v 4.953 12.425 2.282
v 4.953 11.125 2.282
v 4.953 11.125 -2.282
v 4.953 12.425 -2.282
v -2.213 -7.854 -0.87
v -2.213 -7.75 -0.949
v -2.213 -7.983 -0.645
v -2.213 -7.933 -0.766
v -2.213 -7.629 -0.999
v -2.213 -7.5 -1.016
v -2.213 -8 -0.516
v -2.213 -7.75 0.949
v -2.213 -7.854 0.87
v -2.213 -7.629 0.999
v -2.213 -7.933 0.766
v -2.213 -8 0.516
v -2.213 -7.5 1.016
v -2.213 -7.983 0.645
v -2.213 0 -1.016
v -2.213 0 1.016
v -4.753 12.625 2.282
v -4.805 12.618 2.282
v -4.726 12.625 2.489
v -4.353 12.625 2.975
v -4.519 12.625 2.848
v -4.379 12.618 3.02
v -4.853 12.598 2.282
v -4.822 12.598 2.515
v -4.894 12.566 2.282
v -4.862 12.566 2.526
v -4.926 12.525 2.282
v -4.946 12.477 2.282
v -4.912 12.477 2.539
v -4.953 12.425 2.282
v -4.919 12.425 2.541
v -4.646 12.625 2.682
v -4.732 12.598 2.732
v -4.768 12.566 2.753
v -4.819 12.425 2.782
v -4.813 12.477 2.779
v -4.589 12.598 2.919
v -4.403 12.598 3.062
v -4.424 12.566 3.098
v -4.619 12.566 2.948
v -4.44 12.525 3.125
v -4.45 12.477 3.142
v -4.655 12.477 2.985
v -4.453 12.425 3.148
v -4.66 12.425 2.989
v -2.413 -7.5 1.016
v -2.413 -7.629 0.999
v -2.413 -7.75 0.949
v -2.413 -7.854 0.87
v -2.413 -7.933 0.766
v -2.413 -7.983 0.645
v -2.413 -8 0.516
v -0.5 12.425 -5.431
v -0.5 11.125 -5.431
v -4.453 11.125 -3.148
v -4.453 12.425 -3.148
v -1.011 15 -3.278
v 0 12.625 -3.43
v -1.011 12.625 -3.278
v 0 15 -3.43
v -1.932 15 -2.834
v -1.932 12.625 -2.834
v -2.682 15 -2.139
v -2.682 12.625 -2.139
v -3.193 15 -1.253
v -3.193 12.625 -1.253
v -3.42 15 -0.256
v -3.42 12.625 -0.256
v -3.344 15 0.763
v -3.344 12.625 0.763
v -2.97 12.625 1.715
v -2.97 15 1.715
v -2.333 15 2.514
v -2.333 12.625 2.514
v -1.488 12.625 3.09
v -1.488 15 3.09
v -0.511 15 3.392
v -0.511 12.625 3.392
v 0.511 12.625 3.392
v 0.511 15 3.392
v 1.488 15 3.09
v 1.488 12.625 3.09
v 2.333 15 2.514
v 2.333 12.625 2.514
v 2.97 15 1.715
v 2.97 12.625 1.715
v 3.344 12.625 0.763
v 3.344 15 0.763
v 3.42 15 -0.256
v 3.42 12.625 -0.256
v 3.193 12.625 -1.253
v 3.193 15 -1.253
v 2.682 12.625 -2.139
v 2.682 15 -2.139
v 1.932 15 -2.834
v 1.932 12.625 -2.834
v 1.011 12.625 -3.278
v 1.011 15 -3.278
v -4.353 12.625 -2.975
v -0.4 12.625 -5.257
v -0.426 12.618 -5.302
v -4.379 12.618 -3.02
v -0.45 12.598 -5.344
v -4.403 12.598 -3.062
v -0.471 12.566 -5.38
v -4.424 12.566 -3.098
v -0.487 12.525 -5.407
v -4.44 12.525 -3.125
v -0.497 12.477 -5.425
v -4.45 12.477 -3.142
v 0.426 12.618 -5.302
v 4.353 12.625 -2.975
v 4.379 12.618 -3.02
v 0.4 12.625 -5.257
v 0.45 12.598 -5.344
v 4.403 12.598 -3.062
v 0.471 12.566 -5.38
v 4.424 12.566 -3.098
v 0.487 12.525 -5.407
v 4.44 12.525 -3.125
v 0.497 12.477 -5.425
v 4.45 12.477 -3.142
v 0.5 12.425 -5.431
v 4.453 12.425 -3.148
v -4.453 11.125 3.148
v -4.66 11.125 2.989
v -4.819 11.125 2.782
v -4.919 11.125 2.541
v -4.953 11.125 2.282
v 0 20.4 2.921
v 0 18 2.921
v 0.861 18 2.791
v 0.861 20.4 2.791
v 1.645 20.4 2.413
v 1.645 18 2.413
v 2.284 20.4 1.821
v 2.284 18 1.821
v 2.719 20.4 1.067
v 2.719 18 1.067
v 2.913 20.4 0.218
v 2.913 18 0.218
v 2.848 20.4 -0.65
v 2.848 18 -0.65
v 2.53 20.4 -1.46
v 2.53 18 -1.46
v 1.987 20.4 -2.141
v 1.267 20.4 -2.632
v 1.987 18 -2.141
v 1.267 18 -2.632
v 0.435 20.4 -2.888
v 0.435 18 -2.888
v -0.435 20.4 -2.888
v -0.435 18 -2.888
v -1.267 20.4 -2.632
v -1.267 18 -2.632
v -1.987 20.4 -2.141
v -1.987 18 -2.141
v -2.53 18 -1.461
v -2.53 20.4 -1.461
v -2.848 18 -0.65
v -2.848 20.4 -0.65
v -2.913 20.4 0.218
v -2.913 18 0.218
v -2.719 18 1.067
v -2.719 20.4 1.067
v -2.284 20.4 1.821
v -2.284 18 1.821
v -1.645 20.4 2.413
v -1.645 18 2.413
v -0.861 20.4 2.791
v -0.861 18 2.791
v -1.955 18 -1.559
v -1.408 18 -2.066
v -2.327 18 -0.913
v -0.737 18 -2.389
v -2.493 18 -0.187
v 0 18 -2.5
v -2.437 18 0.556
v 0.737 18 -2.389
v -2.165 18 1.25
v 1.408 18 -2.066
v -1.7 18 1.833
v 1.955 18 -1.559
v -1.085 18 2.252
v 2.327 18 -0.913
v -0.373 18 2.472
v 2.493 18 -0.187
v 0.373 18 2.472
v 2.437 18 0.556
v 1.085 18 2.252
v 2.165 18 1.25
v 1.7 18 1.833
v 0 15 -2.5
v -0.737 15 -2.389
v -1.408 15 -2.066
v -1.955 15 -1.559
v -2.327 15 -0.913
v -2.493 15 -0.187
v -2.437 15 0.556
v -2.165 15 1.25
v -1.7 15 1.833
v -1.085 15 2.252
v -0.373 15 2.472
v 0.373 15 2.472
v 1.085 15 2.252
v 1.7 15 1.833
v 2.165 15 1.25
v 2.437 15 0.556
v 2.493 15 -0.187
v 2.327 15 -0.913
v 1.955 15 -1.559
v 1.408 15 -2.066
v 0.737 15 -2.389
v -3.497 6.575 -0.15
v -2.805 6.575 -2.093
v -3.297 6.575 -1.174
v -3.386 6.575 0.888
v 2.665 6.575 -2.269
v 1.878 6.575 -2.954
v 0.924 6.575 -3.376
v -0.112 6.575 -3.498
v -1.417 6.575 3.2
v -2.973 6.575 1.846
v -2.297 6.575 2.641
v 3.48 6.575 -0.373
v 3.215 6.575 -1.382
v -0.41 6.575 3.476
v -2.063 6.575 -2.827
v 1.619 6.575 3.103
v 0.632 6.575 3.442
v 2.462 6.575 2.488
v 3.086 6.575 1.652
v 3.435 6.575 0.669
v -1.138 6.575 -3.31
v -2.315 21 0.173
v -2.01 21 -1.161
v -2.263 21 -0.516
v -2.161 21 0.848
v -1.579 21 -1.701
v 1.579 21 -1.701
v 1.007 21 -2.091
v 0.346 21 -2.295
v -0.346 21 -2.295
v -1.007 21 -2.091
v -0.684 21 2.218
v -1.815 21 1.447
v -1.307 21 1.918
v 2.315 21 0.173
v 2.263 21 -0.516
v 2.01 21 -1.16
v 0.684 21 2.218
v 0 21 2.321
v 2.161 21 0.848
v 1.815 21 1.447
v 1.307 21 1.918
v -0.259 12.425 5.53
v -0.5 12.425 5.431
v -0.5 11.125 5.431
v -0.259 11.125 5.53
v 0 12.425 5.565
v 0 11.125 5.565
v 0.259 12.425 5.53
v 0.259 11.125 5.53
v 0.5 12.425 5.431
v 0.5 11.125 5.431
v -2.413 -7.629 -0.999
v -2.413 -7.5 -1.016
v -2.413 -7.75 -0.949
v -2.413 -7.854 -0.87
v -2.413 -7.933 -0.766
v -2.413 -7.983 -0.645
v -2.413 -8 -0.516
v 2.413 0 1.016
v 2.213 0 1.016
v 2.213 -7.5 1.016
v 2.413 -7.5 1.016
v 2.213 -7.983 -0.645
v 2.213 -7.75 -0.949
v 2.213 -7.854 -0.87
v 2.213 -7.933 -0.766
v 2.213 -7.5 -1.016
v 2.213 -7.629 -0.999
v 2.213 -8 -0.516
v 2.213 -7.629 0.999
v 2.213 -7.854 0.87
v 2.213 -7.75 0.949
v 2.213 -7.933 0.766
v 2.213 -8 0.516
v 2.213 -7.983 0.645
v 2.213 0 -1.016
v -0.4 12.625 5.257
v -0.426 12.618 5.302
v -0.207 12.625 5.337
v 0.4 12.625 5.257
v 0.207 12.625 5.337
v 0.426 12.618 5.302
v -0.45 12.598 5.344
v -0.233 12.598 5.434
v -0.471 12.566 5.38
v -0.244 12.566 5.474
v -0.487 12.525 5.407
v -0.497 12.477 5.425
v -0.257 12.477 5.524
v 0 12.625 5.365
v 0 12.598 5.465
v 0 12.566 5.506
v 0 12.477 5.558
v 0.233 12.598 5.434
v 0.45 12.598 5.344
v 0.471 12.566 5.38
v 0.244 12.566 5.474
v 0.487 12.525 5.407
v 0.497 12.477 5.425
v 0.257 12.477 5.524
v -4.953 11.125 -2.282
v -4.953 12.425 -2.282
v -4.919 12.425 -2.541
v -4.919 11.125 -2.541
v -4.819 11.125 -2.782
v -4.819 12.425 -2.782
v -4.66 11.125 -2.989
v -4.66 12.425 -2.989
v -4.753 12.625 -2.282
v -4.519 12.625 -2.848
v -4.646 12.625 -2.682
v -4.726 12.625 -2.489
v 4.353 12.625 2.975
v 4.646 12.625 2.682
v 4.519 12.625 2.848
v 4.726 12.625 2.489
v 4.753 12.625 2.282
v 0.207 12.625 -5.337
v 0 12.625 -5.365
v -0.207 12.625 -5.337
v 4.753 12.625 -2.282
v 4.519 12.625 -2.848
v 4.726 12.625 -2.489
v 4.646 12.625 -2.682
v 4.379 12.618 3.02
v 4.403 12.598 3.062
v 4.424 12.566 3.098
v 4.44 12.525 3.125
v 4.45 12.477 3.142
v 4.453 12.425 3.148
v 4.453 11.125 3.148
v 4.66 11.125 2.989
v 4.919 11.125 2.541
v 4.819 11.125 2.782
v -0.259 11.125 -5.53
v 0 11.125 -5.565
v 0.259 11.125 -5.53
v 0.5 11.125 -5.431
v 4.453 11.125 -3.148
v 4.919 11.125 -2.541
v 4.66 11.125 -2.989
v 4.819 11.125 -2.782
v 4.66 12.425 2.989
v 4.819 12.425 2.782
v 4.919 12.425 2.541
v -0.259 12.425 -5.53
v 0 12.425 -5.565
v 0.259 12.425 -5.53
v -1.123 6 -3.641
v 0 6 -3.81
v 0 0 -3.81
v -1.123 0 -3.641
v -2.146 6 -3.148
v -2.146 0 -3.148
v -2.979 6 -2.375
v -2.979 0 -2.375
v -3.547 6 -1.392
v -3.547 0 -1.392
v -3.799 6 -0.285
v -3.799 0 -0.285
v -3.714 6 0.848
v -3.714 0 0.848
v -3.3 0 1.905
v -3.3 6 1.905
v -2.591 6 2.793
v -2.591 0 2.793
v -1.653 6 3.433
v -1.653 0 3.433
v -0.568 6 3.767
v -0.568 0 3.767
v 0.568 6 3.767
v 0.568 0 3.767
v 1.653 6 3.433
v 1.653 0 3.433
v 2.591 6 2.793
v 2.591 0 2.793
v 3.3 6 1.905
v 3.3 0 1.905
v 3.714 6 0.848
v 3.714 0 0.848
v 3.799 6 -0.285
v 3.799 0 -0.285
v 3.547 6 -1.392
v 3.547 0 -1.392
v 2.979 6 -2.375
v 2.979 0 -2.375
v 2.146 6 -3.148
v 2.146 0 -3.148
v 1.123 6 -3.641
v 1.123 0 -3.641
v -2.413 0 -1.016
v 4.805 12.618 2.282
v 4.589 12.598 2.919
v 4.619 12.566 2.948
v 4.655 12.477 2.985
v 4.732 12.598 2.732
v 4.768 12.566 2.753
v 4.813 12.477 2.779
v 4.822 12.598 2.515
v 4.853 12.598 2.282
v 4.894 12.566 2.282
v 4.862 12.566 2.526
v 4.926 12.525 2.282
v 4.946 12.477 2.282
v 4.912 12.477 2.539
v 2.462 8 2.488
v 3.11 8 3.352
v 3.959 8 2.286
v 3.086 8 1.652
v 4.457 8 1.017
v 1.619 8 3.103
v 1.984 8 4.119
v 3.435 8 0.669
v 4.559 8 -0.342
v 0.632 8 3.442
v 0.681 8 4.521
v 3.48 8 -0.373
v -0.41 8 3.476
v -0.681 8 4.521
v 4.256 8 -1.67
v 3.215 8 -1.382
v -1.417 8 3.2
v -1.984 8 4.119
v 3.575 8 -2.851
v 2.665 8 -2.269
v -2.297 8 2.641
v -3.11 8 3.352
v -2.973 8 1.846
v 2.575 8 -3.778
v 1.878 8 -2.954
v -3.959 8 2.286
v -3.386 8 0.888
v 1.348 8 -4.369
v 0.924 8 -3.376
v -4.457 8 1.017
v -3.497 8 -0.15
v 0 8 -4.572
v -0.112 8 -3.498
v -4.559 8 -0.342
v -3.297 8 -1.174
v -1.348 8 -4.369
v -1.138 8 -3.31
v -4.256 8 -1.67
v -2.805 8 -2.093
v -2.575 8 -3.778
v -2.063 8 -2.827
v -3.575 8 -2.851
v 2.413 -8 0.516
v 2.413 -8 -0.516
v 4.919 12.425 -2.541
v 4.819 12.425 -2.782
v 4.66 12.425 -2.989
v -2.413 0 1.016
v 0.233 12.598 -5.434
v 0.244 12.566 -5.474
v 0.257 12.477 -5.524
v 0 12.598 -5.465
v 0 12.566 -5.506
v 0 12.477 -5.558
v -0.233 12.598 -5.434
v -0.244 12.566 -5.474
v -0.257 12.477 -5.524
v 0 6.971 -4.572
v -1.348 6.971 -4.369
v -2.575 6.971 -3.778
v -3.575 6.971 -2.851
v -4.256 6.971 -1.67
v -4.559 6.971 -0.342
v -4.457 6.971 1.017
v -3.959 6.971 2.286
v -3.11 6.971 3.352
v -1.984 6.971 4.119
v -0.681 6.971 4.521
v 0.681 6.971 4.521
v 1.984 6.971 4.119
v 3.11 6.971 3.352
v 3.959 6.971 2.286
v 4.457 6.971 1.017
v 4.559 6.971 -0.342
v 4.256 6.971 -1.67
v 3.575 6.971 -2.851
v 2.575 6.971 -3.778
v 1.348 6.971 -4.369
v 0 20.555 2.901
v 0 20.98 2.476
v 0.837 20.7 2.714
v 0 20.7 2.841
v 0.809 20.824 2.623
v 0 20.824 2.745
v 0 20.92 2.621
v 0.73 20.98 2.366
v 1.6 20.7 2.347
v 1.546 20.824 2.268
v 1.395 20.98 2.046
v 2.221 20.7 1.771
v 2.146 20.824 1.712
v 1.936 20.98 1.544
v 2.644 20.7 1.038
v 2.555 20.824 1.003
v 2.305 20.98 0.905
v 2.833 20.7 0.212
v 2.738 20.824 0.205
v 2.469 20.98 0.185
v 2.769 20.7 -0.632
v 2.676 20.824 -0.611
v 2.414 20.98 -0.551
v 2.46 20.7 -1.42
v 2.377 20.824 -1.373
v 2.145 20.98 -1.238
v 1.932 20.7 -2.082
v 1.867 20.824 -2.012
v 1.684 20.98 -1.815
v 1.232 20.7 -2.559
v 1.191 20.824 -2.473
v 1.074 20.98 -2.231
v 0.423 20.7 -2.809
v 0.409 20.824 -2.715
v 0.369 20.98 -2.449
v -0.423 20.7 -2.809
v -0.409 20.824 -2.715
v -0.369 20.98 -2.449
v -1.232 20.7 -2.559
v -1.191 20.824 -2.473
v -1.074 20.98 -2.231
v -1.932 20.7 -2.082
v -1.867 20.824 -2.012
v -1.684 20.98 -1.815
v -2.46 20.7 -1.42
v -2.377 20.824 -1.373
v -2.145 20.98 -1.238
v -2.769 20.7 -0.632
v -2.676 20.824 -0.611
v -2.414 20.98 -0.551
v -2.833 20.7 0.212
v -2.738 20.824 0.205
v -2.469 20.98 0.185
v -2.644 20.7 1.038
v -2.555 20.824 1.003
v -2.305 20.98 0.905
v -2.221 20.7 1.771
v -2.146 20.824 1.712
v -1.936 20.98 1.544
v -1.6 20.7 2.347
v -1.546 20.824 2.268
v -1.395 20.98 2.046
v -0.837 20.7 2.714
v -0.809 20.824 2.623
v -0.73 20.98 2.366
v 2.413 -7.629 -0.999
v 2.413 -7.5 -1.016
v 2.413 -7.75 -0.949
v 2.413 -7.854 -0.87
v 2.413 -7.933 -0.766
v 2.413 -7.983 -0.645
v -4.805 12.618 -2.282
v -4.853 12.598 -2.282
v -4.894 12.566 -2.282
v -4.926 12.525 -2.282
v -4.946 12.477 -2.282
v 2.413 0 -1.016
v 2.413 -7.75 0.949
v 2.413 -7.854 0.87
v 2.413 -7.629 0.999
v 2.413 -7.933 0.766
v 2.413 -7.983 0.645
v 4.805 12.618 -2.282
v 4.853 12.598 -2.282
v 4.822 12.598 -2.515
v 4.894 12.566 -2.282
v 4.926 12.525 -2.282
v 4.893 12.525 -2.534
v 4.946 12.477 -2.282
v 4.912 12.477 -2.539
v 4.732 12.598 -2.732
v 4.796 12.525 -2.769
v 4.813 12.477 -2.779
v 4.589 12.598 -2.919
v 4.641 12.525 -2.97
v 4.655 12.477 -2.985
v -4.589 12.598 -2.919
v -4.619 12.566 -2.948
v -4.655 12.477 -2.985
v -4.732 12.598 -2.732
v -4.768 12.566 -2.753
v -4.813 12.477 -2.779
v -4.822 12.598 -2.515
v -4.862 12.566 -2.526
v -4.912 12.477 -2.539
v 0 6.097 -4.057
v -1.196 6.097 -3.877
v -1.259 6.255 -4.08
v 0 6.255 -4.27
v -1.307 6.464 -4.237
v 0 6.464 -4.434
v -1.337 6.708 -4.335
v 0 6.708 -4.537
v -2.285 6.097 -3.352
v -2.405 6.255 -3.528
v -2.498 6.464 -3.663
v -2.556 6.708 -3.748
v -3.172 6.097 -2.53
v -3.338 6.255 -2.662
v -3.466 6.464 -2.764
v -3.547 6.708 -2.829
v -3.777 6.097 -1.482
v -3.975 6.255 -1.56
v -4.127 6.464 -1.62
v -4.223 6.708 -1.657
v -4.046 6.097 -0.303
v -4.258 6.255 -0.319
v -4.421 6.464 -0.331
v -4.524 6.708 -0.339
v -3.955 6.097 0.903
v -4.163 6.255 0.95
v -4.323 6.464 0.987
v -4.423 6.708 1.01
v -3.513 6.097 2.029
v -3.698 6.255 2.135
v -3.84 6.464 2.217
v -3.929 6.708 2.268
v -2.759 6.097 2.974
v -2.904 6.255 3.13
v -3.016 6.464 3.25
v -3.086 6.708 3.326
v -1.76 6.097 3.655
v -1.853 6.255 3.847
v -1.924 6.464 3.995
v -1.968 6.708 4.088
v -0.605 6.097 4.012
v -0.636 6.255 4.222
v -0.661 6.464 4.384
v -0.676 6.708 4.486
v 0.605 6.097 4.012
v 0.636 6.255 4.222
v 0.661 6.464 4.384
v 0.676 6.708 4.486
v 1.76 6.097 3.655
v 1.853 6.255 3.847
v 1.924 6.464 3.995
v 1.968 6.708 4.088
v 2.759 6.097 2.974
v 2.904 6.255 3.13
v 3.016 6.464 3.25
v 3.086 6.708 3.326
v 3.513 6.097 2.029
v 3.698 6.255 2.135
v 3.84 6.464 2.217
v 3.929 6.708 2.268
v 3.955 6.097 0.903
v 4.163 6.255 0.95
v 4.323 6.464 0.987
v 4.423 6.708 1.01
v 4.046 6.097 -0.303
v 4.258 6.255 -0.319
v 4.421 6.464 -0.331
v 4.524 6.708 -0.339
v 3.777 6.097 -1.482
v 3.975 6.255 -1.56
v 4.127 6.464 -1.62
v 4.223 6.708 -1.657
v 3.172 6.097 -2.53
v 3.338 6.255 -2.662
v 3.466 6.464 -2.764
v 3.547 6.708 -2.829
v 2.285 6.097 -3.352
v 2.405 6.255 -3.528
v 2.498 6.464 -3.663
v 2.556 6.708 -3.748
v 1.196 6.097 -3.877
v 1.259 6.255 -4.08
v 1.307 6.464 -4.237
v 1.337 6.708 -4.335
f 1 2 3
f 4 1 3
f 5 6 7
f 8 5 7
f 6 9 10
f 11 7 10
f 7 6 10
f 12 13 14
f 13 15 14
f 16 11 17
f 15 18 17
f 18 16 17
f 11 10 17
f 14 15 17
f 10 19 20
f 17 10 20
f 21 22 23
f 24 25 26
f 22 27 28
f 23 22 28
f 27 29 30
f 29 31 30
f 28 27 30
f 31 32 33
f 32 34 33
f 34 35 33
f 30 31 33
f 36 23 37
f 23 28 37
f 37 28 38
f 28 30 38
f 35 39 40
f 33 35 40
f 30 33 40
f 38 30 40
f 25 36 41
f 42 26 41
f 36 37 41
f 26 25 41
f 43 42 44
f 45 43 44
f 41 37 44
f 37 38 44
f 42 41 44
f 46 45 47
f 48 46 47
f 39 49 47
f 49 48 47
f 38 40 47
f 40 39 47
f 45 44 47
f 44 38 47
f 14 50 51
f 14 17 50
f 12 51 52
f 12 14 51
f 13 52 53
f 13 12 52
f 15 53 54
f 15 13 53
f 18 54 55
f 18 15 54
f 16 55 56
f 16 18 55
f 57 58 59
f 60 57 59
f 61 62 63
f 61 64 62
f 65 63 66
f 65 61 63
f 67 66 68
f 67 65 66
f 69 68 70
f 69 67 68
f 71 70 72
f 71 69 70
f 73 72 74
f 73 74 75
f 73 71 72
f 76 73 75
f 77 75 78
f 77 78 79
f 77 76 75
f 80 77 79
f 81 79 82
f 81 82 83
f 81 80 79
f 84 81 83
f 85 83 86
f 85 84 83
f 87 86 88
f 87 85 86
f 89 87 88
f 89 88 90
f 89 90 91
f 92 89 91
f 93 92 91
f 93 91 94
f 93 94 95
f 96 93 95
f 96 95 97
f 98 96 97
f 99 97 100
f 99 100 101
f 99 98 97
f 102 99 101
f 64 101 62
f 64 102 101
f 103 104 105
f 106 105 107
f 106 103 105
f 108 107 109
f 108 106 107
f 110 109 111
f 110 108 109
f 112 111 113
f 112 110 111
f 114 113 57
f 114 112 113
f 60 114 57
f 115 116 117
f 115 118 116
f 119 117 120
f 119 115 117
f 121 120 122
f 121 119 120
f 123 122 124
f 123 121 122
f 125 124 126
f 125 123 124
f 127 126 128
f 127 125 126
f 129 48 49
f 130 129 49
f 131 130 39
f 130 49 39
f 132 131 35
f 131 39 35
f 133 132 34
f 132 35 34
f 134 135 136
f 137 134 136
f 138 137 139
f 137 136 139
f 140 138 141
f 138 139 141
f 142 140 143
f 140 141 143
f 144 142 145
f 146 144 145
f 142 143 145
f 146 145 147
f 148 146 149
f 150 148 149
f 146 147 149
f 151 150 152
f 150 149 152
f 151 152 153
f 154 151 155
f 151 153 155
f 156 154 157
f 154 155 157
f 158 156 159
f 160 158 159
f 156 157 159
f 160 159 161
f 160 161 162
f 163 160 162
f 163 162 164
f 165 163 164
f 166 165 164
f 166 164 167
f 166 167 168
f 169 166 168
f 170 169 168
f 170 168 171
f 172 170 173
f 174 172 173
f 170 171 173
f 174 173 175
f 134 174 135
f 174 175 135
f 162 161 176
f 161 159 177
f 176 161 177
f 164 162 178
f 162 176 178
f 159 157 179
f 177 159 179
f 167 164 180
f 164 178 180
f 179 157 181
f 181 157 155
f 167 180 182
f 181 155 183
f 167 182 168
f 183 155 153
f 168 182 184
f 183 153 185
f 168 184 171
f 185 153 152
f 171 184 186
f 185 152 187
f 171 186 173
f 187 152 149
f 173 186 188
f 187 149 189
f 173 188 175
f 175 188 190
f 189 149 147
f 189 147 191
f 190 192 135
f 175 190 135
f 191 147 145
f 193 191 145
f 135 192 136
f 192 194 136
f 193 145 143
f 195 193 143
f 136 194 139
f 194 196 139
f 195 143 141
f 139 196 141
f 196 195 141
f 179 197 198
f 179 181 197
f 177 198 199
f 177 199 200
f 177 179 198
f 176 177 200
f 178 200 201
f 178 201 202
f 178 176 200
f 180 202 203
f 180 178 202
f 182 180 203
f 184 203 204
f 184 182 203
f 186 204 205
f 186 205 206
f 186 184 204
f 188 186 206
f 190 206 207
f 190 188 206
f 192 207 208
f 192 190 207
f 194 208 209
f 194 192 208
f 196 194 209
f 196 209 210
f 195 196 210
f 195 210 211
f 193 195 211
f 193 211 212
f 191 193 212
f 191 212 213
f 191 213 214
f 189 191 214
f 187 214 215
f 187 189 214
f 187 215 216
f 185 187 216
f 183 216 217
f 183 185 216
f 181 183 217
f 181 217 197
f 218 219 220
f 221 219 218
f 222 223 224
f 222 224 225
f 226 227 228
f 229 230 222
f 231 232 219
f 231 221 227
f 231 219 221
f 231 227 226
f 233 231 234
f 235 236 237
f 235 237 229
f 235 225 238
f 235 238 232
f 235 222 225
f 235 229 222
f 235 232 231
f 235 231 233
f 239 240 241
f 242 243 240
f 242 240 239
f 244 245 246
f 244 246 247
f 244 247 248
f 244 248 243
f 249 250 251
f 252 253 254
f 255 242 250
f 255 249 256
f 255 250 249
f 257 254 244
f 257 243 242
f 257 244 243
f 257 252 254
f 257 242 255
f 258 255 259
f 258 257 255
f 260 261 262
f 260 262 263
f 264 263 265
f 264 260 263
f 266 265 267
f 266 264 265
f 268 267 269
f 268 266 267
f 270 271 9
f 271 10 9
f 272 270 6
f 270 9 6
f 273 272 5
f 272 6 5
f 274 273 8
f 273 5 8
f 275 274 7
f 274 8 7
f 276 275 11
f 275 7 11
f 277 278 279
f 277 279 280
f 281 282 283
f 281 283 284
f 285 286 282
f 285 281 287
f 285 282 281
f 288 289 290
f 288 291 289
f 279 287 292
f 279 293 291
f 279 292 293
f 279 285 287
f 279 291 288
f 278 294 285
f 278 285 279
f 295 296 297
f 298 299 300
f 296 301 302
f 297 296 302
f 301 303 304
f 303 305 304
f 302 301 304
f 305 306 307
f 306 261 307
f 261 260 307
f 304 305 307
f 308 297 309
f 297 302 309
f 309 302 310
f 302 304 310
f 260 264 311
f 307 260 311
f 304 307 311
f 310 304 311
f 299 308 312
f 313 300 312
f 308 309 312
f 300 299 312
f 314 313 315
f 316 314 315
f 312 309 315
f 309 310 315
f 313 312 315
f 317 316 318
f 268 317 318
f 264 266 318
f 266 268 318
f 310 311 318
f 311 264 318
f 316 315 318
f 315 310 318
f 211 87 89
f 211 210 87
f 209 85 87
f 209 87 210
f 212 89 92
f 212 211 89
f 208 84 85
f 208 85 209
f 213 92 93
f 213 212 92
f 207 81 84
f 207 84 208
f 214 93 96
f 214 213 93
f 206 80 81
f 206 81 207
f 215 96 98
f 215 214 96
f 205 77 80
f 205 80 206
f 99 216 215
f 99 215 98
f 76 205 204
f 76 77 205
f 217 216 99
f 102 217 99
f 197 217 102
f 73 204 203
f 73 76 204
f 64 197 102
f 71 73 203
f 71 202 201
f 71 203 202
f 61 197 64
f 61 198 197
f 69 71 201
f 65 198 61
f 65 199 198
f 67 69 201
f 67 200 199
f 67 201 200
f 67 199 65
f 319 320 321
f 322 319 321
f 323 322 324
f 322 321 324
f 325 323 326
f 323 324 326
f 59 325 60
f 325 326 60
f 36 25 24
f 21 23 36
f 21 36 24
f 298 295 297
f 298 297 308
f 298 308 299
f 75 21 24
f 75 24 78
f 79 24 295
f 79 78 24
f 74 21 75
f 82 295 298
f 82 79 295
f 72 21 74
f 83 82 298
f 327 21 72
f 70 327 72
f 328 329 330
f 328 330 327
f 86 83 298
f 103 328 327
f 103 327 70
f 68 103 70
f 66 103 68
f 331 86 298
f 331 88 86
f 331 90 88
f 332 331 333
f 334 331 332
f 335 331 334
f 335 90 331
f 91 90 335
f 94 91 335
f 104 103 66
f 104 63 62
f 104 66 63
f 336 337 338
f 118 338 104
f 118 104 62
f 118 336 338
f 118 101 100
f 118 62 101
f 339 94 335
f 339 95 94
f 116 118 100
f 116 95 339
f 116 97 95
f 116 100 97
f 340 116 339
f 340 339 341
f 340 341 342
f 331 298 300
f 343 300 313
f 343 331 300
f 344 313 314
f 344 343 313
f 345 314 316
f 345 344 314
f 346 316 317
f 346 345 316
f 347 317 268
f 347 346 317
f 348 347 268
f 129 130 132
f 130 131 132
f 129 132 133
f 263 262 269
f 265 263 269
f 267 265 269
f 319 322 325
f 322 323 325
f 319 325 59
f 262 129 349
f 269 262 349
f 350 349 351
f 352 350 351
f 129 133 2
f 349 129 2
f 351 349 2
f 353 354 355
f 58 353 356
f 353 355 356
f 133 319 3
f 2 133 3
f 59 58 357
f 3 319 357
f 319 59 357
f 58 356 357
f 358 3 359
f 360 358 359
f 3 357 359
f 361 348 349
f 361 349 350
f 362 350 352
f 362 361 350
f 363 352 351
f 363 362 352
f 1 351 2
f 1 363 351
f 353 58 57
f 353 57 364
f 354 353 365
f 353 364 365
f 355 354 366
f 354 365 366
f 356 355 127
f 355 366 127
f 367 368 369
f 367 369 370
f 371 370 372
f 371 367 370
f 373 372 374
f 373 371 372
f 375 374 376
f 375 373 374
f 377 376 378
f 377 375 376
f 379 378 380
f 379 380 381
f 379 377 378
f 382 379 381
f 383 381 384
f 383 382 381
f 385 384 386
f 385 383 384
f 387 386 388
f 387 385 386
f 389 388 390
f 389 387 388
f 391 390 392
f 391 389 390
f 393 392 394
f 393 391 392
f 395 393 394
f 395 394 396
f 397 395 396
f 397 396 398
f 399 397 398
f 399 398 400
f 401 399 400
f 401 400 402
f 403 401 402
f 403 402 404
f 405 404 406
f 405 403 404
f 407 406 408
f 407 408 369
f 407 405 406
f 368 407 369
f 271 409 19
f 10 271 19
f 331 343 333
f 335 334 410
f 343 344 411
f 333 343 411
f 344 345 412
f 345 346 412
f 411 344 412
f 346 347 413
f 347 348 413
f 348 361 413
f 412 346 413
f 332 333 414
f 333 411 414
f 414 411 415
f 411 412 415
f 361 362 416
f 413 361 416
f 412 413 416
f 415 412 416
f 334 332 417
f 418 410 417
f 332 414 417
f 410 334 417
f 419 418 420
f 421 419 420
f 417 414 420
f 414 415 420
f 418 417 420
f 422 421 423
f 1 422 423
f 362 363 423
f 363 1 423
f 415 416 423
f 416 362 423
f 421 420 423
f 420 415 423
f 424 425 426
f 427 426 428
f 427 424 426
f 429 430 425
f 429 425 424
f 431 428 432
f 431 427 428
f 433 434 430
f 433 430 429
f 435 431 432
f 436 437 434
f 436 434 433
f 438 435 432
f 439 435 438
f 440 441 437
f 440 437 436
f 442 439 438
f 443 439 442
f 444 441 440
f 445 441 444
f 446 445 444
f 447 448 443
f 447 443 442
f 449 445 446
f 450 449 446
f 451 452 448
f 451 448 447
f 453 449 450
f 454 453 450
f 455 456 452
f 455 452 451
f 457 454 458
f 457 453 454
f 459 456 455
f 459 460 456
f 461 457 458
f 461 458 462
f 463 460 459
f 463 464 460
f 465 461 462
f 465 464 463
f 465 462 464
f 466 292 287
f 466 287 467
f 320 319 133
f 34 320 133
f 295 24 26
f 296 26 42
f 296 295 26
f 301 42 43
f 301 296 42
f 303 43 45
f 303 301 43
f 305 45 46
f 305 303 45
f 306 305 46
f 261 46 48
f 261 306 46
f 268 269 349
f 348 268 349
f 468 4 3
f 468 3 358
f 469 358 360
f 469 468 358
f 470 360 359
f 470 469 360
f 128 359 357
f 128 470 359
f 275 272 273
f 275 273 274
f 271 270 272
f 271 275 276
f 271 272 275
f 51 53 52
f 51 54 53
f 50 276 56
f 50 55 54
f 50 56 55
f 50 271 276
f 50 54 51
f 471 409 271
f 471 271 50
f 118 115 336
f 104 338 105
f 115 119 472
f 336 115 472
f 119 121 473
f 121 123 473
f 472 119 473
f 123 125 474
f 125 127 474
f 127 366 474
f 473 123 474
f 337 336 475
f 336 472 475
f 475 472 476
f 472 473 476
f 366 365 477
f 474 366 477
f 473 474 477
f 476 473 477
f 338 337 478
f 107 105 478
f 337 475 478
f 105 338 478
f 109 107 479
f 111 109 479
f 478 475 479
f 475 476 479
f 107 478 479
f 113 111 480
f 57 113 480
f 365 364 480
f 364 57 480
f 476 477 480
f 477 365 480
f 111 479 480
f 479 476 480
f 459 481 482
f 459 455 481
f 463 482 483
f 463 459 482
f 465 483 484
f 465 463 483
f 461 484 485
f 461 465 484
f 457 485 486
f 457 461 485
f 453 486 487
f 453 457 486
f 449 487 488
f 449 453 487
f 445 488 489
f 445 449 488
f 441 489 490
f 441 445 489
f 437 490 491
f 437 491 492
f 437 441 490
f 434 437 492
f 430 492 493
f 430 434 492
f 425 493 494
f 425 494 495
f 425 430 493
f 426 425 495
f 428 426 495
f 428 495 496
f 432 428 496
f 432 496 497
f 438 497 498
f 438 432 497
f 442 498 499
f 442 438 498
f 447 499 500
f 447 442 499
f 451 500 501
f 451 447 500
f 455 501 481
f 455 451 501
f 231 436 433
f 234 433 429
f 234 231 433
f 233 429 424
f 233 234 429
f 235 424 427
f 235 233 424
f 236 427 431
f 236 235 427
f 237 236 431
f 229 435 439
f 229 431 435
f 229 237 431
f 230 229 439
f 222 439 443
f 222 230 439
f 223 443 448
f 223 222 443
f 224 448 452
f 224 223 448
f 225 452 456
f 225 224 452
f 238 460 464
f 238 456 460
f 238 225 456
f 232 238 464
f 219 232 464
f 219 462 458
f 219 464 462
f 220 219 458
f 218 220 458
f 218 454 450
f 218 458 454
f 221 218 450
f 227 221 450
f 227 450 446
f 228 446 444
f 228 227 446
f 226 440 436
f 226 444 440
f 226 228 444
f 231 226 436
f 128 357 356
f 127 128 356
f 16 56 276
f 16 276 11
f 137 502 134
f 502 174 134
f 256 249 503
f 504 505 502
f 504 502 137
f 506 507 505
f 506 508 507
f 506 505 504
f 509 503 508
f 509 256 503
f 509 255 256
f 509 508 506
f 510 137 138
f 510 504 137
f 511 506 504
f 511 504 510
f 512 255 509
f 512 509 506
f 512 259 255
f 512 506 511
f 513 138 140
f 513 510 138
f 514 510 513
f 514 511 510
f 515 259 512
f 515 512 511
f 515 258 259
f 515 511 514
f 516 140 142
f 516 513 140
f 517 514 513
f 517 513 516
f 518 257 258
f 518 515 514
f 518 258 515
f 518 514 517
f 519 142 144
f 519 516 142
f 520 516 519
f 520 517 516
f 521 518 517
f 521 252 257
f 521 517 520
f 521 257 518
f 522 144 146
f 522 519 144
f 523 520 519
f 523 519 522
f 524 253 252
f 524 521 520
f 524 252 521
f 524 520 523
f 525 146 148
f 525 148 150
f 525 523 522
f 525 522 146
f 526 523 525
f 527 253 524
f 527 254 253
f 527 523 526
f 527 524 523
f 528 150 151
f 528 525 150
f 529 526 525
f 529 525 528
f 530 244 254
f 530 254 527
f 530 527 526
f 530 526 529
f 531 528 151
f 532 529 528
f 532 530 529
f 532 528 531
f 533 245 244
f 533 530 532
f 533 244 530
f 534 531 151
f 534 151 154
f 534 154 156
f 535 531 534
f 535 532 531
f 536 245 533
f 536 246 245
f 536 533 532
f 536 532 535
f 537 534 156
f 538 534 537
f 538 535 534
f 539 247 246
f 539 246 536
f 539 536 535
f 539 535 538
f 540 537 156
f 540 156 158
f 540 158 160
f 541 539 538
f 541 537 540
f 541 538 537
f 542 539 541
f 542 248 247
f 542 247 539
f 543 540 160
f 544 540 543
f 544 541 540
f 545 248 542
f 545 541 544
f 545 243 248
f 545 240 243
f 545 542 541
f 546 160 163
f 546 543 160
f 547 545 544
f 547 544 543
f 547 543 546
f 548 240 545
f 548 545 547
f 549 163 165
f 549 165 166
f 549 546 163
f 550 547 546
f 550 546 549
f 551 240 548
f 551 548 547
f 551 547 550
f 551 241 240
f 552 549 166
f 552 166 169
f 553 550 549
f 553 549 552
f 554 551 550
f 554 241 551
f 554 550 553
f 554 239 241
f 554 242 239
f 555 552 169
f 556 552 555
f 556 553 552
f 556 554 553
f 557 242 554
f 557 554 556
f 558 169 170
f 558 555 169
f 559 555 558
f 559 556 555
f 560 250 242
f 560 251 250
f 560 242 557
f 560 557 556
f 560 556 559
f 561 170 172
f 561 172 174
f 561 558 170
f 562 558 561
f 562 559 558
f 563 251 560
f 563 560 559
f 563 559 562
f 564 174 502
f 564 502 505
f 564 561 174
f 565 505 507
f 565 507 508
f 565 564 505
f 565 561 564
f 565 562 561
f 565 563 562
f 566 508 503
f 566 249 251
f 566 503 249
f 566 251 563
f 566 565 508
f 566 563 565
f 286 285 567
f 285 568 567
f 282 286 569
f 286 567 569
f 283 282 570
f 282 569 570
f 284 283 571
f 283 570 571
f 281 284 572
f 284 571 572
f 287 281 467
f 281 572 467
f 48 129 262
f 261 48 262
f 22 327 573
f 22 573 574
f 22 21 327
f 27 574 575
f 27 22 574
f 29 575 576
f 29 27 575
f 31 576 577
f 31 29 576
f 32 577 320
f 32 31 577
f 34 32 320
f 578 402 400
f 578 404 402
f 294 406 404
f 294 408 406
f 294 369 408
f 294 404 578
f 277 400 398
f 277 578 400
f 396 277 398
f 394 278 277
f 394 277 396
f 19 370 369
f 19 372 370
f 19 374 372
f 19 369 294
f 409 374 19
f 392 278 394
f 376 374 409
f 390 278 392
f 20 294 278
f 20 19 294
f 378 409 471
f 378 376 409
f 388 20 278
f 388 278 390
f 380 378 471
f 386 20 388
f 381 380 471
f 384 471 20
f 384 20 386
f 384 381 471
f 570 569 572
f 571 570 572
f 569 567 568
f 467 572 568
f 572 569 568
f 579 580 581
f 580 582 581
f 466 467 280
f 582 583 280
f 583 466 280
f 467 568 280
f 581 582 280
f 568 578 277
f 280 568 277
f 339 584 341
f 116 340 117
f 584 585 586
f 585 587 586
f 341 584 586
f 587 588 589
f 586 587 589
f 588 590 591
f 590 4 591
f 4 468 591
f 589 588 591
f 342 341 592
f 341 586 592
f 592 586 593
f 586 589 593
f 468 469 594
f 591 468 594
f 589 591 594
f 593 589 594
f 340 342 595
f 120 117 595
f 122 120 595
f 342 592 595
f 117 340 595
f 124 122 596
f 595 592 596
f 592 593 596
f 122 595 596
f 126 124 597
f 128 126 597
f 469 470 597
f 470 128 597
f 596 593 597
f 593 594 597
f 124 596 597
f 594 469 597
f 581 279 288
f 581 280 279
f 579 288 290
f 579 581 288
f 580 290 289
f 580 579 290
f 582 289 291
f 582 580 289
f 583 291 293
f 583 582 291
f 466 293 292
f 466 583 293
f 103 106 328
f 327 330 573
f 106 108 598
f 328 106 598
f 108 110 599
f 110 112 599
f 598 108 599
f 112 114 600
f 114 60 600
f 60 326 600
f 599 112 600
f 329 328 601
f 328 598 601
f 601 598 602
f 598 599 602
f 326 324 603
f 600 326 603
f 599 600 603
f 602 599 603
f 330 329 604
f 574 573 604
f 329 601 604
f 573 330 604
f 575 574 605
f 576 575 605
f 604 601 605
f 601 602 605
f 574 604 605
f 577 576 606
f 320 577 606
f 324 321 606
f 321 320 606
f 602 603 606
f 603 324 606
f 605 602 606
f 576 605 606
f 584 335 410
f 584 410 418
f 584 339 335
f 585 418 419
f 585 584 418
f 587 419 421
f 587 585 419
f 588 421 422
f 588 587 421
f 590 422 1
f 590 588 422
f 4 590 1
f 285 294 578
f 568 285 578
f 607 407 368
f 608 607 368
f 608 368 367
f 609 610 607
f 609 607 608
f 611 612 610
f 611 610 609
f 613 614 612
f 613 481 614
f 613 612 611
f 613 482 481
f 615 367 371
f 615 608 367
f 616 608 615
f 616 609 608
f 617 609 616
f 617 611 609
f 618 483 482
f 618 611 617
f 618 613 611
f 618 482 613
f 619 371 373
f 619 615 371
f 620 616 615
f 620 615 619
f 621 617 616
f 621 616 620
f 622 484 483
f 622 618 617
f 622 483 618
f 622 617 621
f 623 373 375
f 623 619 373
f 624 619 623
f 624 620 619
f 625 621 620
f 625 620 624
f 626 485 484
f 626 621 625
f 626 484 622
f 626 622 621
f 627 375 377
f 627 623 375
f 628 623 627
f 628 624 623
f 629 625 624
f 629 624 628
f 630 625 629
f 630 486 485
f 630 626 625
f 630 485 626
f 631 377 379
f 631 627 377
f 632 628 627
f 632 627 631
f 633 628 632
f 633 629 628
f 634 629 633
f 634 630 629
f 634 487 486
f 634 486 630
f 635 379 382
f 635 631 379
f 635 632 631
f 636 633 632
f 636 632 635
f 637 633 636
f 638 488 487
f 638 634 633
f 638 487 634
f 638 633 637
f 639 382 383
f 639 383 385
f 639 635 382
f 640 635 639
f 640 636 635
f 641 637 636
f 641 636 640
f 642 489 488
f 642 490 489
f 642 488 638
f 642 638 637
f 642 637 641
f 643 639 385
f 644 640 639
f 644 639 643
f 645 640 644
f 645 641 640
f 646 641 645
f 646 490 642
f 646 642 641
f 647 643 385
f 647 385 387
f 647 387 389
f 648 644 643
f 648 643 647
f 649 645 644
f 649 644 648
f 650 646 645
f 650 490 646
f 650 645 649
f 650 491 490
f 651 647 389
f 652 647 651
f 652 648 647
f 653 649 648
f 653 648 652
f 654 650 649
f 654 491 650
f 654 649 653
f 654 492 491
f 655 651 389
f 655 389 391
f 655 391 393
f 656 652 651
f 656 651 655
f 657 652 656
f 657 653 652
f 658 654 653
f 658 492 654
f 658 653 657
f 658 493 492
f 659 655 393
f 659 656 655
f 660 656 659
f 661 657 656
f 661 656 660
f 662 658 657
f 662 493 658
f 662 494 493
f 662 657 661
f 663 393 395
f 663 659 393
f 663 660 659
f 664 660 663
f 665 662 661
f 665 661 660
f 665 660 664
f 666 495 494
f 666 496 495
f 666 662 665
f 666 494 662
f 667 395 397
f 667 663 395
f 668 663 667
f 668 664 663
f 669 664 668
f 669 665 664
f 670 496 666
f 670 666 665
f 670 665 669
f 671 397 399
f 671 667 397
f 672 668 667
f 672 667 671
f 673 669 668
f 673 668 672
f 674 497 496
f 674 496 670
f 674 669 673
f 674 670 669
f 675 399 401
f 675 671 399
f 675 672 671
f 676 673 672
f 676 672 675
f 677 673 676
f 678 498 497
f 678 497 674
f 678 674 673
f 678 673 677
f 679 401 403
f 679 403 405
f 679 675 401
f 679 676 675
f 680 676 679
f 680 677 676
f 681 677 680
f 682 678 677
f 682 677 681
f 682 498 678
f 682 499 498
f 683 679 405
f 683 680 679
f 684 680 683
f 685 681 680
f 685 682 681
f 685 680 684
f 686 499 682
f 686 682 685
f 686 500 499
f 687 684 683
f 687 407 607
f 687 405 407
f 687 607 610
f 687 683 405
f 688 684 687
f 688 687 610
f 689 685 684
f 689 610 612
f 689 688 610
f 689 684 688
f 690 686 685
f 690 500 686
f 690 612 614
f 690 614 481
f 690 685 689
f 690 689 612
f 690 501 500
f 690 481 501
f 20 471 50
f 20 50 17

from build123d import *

# Parameters (mm, degrees)
SKETCH3_R              = 2.921
BOSS_EXTRUDE1_DEPTH    = 3
FILLET3_R              = 0.6
FILLET1_R              = 1
SKETCH4_W              = 0.2
SKETCH4_H              = 2.032
BOSS_EXTRUDE2_DEPTH    = 8
FILLET2_R              = 0.5
BOSS_EXTRUDE3_DEPTH    = 1.5
FILLET4_R              = 1
FILLET5_R              = 0.2
CUT_EXTRUDE4_START     = -4.549597879
CUT_EXTRUDE4_OUTLINE_R = 3.5
CUT_EXTRUDE4_DEPTH     = 4.549597879


with BuildPart() as part:
    # Sketch2 → Revolve1 (revolve)
    with BuildSketch(Plane.XY, mode=Mode.PRIVATE) as revolve1_sk:
        Polygon((0, 0), (3.81, 0), (3.81, 6), (4.572, 6), (4.572, 8), (3.43, 8), (3.43, 15), (2.5, 15), (2.5, 18), (0, 18), align=None)
    revolve(revolve1_sk.sketch.rotate(Axis((0, 0, 0), (0, 1, 0)), 90), axis=Axis((0, 0, 0), (0, 1, 0)))

    # Sketch3 → Boss-Extrude1 (add)
    with BuildSketch(Plane(origin=(0, 18, 0), x_dir=(1, 0, 0), z_dir=(0, 1, 0))):
        with Locations(Location((0, 0, 0), (0, 0, 270))):
            Circle(SKETCH3_R)
    extrude(amount=BOSS_EXTRUDE1_DEPTH)

    # Fillet3
    fillet3_edges = [part.edges().sort_by_distance(p)[0] for p in [
        (0, 21, -2.921),
    ]]
    fillet(fillet3_edges, radius=FILLET3_R)

    # Fillet1
    # the kernel refuses this fillet: 1 mm, written as the material it takes off along each edge
    with BuildSketch(Plane(origin=(0, 6, 0), x_dir=(0, 0, -1), z_dir=(1, 0, 0))) as fillet1_piece_1:
        with BuildLine():
            CenterArc((3.572, 0.971265154), FILLET1_R, 283.768528752, 76.231471248)
            Line((3.81, 0), (3.81476, -0.019425303))
            ThreePointArc((3.81476, -0.019425303), (4.191, -0.02), (4.572, -0.02))
            Line((4.572, -0.02), (4.592, 0))
            Line((4.592, 0), (4.592, 0.971265154))
            Line((4.592, 0.971265154), (4.572, 0.971265154))
        make_face()
    revolve(axis=Axis((0, 6, 0), (0, 1, 0)), mode=Mode.SUBTRACT)

    # Sketch4 → Boss-Extrude2 (add)
    with BuildSketch(Plane.XZ):
        with Locations((-2.313, 0)):
            Rectangle(SKETCH4_W, SKETCH4_H)
        with Locations((2.313, 0)):
            Rectangle(SKETCH4_W, SKETCH4_H)
    extrude(amount=BOSS_EXTRUDE2_DEPTH)

    # Fillet2
    fillet2_edges = [part.edges().sort_by_distance(p)[0] for p in [
        (-2.313, -8, -1.016),
        (-2.313, -8, 1.016),
        (2.313, -8, 1.016),
        (2.313, -8, -1.016),
    ]]
    fillet(fillet2_edges, radius=FILLET2_R)

    # Sketch5 → Boss-Extrude3 (add)
    with BuildSketch(Plane(origin=(0, 11.125, 0), x_dir=(1, 0, 0), z_dir=(0, 1, 0))):
        Polygon((-4.953, -2.859615883), (0, -5.719231767), (4.953, -2.859615883), (4.953, 2.859615883), (0, 5.719231767), (-4.953, 2.859615883), align=None)
    extrude(amount=BOSS_EXTRUDE3_DEPTH)

    # Fillet4
    fillet4_edges = [part.edges().sort_by_distance(p)[0] for p in [
        (-4.953, 11.875, -2.859615883),
        (-4.953, 11.875, 2.859615883),
        (0, 11.875, 5.719231767),
        (4.953, 11.875, 2.859615883),
        (4.953, 11.875, -2.859615883),
        (0, 11.875, -5.719231767),
    ]]
    fillet(fillet4_edges, radius=FILLET4_R)

    # Fillet5
    fillet5_edges = [part.edges().sort_by_distance(p)[0] for p in [
        (2.4765, 12.625, -4.289423825),
        (4.953, 12.625, 0),
        (-4.953, 12.625, 0),
        (-2.4765, 12.625, 4.289423825),
        (2.4765, 12.625, 4.289423825),
        (-2.4765, 12.625, -4.289423825),
        (0, 12.625, -5.564531228),
        (-4.819025404, 12.625, -2.782265614),
        (-4.819025404, 12.625, 2.782265614),
        (0, 12.625, 5.564531228),
        (4.819025404, 12.625, 2.782265614),
        (4.819025404, 12.625, -2.782265614),
    ]]
    fillet(fillet5_edges, radius=FILLET5_R)

    # Cut-Extrude4: read off the stored shape, not the designer's step
    # Cut-Extrude4 outline → Cut-Extrude4 (cut)
    with BuildSketch(Plane(origin=(164.73864921, 11.125, 74.332771541), x_dir=(-0.11726284884639014, 0, 0.9931009134425507), z_dir=(0, 1, 0)).offset(CUT_EXTRUDE4_START)):
        with Locations((-54.502219995, -172.318575564)):
            Circle(CUT_EXTRUDE4_OUTLINE_R)
    extrude(amount=CUT_EXTRUDE4_DEPTH, mode=Mode.SUBTRACT)


solid = part.part
